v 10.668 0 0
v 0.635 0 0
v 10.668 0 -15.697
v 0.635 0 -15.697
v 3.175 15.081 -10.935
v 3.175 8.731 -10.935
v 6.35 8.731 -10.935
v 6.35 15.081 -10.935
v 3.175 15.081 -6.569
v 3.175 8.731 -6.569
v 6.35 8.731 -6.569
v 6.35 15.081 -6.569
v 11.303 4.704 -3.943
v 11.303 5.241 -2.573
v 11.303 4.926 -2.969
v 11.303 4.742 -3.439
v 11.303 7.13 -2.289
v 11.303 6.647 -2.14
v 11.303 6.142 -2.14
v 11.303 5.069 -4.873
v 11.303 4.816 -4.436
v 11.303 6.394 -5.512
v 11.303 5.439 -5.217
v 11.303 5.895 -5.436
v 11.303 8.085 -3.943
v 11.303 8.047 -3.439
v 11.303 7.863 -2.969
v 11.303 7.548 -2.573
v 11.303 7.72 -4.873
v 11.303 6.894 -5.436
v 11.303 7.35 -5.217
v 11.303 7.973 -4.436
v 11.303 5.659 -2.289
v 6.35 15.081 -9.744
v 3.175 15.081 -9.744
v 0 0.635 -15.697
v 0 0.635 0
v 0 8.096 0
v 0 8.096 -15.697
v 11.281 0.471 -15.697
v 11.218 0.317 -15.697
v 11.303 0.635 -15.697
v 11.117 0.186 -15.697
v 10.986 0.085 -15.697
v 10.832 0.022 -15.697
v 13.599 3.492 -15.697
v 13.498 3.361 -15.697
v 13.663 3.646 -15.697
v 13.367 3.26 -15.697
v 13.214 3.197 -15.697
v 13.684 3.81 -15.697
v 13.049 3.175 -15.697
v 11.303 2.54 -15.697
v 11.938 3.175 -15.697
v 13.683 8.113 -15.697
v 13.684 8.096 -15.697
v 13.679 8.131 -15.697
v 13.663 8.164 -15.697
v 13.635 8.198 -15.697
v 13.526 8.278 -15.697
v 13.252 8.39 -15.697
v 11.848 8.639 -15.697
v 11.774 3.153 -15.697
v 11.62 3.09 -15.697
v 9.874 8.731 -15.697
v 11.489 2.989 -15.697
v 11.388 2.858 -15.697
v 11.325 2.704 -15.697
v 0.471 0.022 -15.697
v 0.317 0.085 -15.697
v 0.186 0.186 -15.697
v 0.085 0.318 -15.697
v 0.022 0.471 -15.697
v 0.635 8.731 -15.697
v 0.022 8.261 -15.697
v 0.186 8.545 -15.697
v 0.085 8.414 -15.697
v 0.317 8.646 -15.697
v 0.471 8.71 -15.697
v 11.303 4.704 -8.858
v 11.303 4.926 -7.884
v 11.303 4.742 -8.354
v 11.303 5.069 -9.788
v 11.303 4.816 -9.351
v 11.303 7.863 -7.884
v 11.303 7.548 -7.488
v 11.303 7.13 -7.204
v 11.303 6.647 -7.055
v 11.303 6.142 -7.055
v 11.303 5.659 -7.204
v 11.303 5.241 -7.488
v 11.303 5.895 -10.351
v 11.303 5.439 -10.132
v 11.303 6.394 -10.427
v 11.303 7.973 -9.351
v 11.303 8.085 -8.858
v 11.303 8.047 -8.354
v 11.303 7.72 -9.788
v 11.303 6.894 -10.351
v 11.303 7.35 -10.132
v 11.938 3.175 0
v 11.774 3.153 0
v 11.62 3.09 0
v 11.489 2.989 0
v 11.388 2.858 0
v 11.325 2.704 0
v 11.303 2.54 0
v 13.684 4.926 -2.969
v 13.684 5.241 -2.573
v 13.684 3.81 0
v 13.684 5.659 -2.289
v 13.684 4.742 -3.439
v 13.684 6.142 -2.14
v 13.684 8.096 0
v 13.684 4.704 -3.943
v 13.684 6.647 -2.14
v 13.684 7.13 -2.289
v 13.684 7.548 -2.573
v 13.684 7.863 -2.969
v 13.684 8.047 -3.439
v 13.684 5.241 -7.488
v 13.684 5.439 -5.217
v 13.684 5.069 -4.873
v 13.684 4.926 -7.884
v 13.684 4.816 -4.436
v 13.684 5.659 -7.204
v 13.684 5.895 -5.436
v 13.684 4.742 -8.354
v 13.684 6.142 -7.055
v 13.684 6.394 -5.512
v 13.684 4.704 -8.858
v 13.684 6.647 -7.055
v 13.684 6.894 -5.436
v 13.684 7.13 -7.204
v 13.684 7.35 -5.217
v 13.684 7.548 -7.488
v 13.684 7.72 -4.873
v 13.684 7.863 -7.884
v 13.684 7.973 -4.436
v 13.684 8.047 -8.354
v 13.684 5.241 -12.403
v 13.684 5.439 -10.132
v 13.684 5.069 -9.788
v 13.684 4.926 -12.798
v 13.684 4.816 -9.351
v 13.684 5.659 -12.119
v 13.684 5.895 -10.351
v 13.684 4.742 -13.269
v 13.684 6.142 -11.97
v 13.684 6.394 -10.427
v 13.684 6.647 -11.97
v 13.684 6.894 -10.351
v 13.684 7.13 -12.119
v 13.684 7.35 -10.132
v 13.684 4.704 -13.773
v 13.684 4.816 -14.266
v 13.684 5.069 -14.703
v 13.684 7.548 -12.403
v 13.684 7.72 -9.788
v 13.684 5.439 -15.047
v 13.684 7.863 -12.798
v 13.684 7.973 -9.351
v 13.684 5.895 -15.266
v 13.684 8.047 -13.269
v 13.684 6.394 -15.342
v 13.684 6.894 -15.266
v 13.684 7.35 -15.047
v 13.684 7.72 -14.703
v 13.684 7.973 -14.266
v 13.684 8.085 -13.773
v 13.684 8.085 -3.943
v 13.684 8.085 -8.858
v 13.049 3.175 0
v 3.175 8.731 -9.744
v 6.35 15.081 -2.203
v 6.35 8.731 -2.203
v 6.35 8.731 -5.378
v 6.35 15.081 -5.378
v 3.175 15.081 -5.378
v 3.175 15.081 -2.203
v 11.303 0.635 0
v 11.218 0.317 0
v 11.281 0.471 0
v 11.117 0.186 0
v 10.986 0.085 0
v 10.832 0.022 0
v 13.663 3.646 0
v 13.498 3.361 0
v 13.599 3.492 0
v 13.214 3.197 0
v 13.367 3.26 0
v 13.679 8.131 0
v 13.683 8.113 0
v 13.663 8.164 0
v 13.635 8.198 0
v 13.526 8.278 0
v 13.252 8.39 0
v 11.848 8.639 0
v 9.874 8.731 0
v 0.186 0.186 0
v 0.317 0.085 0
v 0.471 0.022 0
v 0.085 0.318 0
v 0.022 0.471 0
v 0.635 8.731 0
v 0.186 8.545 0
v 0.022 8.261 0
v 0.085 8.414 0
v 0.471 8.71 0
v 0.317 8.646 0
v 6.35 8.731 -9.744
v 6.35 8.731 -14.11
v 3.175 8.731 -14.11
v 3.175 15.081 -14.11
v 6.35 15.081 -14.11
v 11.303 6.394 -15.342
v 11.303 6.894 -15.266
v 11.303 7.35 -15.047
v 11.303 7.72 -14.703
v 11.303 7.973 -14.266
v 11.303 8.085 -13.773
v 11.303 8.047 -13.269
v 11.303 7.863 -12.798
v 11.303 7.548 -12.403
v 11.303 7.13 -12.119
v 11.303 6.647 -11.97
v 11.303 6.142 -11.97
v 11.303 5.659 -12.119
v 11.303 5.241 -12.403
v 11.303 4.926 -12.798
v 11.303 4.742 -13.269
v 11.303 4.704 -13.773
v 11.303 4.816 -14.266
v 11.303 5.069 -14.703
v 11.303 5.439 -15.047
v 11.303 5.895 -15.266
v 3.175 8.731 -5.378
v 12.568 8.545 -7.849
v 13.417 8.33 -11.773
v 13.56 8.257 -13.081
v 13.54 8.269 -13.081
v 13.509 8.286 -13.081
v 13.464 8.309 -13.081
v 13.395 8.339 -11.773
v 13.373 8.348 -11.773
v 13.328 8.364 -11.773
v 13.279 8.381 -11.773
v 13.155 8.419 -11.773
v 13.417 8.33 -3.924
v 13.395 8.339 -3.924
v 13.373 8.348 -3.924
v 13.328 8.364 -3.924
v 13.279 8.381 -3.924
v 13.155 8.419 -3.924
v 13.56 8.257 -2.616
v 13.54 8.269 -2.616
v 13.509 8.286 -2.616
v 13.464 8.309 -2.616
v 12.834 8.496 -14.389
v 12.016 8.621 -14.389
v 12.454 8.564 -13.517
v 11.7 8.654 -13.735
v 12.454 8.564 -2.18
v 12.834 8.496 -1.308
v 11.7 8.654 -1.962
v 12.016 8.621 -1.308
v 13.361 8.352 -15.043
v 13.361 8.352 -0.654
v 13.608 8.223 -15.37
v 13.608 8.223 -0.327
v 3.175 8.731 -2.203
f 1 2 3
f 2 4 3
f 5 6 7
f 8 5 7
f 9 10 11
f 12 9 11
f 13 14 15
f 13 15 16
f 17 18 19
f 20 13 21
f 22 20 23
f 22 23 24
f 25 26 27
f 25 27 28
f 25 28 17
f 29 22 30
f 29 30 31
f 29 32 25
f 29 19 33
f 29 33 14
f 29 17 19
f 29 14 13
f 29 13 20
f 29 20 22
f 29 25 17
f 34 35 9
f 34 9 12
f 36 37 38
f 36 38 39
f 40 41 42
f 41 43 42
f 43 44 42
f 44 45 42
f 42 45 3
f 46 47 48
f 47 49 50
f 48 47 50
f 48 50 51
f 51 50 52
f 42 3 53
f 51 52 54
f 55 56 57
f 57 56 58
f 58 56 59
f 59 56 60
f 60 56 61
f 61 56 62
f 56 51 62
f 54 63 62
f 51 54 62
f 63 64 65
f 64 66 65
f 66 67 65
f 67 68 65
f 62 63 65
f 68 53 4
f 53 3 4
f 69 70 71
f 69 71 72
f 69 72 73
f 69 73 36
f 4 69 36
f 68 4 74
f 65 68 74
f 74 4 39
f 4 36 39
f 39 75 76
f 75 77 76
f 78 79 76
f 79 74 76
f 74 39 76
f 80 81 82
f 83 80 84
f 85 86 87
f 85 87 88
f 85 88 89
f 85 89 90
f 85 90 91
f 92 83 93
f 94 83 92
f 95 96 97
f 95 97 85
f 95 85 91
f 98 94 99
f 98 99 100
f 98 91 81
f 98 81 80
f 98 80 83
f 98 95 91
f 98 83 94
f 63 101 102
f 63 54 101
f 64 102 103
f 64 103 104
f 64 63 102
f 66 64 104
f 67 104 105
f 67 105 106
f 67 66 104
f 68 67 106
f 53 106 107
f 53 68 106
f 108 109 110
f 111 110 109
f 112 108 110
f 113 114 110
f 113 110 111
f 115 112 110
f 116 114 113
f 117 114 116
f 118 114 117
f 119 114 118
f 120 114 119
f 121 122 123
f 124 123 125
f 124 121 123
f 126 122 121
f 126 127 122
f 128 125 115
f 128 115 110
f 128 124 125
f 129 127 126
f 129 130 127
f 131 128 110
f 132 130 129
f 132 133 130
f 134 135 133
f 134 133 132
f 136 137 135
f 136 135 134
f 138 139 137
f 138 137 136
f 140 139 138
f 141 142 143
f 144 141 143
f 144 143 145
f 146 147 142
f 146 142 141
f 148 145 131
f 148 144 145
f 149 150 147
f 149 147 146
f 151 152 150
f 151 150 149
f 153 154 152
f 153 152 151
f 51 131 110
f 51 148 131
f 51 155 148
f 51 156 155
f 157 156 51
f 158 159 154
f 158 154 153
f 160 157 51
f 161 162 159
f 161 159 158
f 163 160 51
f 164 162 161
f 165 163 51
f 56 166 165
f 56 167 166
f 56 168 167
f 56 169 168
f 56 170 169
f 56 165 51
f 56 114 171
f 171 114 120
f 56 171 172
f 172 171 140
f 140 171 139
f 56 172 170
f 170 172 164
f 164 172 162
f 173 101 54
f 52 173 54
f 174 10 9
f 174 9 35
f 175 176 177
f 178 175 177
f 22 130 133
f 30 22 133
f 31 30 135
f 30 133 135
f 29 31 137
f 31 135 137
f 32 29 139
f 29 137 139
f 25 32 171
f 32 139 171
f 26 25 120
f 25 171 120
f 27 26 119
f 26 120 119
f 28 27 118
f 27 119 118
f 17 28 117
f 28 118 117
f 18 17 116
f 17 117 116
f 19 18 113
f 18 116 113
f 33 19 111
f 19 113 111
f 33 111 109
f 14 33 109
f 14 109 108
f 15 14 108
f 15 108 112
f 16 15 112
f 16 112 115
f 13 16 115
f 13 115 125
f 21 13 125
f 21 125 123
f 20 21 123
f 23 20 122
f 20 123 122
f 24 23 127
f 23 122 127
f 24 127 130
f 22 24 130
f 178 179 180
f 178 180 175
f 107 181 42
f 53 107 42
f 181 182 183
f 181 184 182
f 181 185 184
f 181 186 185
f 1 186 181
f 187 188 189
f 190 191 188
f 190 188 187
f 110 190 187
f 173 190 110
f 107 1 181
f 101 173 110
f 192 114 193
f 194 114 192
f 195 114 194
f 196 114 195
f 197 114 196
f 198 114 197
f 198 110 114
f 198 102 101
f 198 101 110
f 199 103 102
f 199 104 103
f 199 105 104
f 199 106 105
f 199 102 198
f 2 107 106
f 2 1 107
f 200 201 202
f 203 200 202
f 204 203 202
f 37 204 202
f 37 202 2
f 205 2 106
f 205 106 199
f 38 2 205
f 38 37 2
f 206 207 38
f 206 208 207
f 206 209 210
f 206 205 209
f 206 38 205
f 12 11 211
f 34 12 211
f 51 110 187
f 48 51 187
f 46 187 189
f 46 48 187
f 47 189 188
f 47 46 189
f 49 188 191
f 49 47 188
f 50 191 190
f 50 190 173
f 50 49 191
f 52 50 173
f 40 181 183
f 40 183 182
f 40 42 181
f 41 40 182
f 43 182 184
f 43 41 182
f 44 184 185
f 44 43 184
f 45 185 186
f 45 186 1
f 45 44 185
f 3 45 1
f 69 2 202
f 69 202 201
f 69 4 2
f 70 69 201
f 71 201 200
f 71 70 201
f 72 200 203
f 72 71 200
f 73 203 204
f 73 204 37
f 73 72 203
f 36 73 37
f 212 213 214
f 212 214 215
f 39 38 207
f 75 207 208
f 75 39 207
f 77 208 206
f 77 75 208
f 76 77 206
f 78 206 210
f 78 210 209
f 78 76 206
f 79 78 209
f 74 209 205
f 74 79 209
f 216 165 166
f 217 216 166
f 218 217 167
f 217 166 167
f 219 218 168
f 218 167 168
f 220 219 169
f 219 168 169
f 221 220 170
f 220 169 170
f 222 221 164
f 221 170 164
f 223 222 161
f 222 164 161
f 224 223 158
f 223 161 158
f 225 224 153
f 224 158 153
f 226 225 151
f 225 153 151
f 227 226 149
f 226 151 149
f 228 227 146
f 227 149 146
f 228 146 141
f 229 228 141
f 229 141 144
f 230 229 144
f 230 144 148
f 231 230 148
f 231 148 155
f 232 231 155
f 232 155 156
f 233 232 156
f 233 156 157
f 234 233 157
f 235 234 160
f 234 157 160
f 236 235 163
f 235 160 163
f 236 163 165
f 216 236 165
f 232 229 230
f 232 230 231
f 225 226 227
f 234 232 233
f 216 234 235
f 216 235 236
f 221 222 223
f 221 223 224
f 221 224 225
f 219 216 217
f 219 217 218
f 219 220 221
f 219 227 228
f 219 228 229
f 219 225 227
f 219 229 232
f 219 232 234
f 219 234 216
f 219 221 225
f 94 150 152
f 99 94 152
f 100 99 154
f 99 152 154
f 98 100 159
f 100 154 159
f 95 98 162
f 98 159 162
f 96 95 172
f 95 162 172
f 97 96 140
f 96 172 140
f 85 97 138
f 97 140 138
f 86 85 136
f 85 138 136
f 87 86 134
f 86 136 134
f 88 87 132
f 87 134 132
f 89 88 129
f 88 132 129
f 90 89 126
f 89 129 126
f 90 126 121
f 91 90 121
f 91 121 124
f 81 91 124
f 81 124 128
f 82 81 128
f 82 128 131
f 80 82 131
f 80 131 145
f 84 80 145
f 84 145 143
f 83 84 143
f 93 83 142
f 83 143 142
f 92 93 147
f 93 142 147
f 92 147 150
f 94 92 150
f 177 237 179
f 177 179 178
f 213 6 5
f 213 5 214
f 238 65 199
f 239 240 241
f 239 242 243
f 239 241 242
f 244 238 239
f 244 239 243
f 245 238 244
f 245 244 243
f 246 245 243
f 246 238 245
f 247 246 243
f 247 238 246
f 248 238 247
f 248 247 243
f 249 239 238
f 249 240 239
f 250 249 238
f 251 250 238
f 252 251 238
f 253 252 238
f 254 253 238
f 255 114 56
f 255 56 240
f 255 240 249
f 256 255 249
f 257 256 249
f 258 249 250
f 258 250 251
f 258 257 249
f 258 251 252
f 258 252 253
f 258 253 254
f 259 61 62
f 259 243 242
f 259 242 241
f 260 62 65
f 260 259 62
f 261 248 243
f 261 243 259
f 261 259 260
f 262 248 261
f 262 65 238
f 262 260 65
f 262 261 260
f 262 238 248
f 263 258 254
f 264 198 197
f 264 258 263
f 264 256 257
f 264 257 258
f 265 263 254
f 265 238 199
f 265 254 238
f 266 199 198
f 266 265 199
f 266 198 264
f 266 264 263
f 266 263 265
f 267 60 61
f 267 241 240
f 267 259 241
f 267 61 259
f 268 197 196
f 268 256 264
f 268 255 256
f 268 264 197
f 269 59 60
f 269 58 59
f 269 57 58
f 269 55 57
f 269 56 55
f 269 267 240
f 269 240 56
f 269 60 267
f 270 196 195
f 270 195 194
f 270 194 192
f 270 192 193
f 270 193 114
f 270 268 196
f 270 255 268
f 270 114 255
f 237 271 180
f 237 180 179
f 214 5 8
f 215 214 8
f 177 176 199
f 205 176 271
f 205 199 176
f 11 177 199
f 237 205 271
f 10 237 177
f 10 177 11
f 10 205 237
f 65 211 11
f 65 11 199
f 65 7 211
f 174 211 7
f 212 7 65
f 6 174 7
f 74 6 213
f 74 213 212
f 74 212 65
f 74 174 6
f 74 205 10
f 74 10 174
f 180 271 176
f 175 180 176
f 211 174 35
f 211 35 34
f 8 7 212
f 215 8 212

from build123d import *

# Parameters (mm, degrees)
SKETCH1_W           = 11.303
SKETCH1_H           = 15.6972
BOSS_EXTRUDE1_DEPTH = 8.73125
SKETCH2_W           = 15.6972
SKETCH2_H           = 5.55625
BOSS_EXTRUDE2_DEPTH = 2.38125
FILLET1_R           = 0.635
SKETCH5_R           = 1.69545
CUT_EXTRUDE1_DEPTH  = 2.38125
SKETCH7_W           = 3.175
SKETCH7_H           = 3.175
BOSS_EXTRUDE3_DEPTH = 6.35
FILLET2_SIZE        = 0.635
FILLET2_SIZE_2      = 3.81
FILLET3_R           = 0.635


with BuildPart() as part:
    # Sketch1 → Boss-Extrude1 (new body)
    with BuildSketch(Plane(origin=(0, 0, 0), x_dir=(1, 0, 0), z_dir=(0, 1, 0))):
        with Locations((5.6515, 7.8486)):
            Rectangle(SKETCH1_W, SKETCH1_H)
    extrude(amount=BOSS_EXTRUDE1_DEPTH)

    # Sketch2 → Boss-Extrude2 (add)
    with BuildSketch(Plane(origin=(11.303, 0, 0), x_dir=(0, 0, -1), z_dir=(1, 0, 0))):
        with Locations((7.8486, 5.953125)):
            Rectangle(SKETCH2_W, SKETCH2_H)
    extrude(amount=BOSS_EXTRUDE2_DEPTH)

    # Fillet1
    fillet1_edges = [part.edges().sort_by_distance(p)[0] for p in [
        (13.68425, 3.175, -7.8486),
    ]]
    fillet(fillet1_edges, radius=FILLET1_R)

    # Sketch5 → Cut-Extrude1 (cut)
    with BuildSketch(Plane(origin=(13.68425, 0, 0), x_dir=(0, 0, -1), z_dir=(1, 0, 0))):
        with Locations((13.64615, 6.39445)):
            Circle(SKETCH5_R)
        with Locations((8.73125, 6.39445)):
            Circle(SKETCH5_R)
        with Locations((3.81635, 6.39445)):
            Circle(SKETCH5_R)
    extrude(amount=-CUT_EXTRUDE1_DEPTH, mode=Mode.SUBTRACT)

    # Sketch7 → Boss-Extrude3 (add)
    with BuildSketch(Plane(origin=(0, 8.73125, 0), x_dir=(1, 0, 0), z_dir=(0, 1, 0))):
        with Locations((4.7625, 3.79095)):
            Rectangle(SKETCH7_W, SKETCH7_H)
        with Locations((4.7625, 12.5222)):
            Rectangle(SKETCH7_W, SKETCH7_H)
        with Locations((4.7625, 8.156575)):
            Rectangle(SKETCH7_W, SKETCH7_H)
    extrude(amount=BOSS_EXTRUDE3_DEPTH)

    # Fillet2
    # an asymmetric fillet: 3.81, 0.635 mm, written as the material it takes off along each edge
    with BuildSketch(Plane(origin=(13.68425, 8.73125, 9.525), x_dir=(0, -1, 0), z_dir=(0, 0, -1))) as fillet2_piece_1:
        with BuildLine():
            Bezier((FILLET2_SIZE, 0), (0, 0), (0, FILLET2_SIZE_2), weights=[1, 0.707106781, 1])
            Line((0, FILLET2_SIZE_2), (0, 0))
            Line((0, 0), (FILLET2_SIZE, 0))
        make_face()
    extrude(amount=34.7472, mode=Mode.SUBTRACT)

    # Fillet3
    fillet3_edges = [part.edges().sort_by_distance(p)[0] for p in [
        (11.303, 3.175, -7.8486),
        (11.303, 0, -7.8486),
        (0, 0, -7.8486),
        (0, 8.73125, -7.8486),
    ]]
    fillet(fillet3_edges, radius=FILLET3_R)


solid = part.part
